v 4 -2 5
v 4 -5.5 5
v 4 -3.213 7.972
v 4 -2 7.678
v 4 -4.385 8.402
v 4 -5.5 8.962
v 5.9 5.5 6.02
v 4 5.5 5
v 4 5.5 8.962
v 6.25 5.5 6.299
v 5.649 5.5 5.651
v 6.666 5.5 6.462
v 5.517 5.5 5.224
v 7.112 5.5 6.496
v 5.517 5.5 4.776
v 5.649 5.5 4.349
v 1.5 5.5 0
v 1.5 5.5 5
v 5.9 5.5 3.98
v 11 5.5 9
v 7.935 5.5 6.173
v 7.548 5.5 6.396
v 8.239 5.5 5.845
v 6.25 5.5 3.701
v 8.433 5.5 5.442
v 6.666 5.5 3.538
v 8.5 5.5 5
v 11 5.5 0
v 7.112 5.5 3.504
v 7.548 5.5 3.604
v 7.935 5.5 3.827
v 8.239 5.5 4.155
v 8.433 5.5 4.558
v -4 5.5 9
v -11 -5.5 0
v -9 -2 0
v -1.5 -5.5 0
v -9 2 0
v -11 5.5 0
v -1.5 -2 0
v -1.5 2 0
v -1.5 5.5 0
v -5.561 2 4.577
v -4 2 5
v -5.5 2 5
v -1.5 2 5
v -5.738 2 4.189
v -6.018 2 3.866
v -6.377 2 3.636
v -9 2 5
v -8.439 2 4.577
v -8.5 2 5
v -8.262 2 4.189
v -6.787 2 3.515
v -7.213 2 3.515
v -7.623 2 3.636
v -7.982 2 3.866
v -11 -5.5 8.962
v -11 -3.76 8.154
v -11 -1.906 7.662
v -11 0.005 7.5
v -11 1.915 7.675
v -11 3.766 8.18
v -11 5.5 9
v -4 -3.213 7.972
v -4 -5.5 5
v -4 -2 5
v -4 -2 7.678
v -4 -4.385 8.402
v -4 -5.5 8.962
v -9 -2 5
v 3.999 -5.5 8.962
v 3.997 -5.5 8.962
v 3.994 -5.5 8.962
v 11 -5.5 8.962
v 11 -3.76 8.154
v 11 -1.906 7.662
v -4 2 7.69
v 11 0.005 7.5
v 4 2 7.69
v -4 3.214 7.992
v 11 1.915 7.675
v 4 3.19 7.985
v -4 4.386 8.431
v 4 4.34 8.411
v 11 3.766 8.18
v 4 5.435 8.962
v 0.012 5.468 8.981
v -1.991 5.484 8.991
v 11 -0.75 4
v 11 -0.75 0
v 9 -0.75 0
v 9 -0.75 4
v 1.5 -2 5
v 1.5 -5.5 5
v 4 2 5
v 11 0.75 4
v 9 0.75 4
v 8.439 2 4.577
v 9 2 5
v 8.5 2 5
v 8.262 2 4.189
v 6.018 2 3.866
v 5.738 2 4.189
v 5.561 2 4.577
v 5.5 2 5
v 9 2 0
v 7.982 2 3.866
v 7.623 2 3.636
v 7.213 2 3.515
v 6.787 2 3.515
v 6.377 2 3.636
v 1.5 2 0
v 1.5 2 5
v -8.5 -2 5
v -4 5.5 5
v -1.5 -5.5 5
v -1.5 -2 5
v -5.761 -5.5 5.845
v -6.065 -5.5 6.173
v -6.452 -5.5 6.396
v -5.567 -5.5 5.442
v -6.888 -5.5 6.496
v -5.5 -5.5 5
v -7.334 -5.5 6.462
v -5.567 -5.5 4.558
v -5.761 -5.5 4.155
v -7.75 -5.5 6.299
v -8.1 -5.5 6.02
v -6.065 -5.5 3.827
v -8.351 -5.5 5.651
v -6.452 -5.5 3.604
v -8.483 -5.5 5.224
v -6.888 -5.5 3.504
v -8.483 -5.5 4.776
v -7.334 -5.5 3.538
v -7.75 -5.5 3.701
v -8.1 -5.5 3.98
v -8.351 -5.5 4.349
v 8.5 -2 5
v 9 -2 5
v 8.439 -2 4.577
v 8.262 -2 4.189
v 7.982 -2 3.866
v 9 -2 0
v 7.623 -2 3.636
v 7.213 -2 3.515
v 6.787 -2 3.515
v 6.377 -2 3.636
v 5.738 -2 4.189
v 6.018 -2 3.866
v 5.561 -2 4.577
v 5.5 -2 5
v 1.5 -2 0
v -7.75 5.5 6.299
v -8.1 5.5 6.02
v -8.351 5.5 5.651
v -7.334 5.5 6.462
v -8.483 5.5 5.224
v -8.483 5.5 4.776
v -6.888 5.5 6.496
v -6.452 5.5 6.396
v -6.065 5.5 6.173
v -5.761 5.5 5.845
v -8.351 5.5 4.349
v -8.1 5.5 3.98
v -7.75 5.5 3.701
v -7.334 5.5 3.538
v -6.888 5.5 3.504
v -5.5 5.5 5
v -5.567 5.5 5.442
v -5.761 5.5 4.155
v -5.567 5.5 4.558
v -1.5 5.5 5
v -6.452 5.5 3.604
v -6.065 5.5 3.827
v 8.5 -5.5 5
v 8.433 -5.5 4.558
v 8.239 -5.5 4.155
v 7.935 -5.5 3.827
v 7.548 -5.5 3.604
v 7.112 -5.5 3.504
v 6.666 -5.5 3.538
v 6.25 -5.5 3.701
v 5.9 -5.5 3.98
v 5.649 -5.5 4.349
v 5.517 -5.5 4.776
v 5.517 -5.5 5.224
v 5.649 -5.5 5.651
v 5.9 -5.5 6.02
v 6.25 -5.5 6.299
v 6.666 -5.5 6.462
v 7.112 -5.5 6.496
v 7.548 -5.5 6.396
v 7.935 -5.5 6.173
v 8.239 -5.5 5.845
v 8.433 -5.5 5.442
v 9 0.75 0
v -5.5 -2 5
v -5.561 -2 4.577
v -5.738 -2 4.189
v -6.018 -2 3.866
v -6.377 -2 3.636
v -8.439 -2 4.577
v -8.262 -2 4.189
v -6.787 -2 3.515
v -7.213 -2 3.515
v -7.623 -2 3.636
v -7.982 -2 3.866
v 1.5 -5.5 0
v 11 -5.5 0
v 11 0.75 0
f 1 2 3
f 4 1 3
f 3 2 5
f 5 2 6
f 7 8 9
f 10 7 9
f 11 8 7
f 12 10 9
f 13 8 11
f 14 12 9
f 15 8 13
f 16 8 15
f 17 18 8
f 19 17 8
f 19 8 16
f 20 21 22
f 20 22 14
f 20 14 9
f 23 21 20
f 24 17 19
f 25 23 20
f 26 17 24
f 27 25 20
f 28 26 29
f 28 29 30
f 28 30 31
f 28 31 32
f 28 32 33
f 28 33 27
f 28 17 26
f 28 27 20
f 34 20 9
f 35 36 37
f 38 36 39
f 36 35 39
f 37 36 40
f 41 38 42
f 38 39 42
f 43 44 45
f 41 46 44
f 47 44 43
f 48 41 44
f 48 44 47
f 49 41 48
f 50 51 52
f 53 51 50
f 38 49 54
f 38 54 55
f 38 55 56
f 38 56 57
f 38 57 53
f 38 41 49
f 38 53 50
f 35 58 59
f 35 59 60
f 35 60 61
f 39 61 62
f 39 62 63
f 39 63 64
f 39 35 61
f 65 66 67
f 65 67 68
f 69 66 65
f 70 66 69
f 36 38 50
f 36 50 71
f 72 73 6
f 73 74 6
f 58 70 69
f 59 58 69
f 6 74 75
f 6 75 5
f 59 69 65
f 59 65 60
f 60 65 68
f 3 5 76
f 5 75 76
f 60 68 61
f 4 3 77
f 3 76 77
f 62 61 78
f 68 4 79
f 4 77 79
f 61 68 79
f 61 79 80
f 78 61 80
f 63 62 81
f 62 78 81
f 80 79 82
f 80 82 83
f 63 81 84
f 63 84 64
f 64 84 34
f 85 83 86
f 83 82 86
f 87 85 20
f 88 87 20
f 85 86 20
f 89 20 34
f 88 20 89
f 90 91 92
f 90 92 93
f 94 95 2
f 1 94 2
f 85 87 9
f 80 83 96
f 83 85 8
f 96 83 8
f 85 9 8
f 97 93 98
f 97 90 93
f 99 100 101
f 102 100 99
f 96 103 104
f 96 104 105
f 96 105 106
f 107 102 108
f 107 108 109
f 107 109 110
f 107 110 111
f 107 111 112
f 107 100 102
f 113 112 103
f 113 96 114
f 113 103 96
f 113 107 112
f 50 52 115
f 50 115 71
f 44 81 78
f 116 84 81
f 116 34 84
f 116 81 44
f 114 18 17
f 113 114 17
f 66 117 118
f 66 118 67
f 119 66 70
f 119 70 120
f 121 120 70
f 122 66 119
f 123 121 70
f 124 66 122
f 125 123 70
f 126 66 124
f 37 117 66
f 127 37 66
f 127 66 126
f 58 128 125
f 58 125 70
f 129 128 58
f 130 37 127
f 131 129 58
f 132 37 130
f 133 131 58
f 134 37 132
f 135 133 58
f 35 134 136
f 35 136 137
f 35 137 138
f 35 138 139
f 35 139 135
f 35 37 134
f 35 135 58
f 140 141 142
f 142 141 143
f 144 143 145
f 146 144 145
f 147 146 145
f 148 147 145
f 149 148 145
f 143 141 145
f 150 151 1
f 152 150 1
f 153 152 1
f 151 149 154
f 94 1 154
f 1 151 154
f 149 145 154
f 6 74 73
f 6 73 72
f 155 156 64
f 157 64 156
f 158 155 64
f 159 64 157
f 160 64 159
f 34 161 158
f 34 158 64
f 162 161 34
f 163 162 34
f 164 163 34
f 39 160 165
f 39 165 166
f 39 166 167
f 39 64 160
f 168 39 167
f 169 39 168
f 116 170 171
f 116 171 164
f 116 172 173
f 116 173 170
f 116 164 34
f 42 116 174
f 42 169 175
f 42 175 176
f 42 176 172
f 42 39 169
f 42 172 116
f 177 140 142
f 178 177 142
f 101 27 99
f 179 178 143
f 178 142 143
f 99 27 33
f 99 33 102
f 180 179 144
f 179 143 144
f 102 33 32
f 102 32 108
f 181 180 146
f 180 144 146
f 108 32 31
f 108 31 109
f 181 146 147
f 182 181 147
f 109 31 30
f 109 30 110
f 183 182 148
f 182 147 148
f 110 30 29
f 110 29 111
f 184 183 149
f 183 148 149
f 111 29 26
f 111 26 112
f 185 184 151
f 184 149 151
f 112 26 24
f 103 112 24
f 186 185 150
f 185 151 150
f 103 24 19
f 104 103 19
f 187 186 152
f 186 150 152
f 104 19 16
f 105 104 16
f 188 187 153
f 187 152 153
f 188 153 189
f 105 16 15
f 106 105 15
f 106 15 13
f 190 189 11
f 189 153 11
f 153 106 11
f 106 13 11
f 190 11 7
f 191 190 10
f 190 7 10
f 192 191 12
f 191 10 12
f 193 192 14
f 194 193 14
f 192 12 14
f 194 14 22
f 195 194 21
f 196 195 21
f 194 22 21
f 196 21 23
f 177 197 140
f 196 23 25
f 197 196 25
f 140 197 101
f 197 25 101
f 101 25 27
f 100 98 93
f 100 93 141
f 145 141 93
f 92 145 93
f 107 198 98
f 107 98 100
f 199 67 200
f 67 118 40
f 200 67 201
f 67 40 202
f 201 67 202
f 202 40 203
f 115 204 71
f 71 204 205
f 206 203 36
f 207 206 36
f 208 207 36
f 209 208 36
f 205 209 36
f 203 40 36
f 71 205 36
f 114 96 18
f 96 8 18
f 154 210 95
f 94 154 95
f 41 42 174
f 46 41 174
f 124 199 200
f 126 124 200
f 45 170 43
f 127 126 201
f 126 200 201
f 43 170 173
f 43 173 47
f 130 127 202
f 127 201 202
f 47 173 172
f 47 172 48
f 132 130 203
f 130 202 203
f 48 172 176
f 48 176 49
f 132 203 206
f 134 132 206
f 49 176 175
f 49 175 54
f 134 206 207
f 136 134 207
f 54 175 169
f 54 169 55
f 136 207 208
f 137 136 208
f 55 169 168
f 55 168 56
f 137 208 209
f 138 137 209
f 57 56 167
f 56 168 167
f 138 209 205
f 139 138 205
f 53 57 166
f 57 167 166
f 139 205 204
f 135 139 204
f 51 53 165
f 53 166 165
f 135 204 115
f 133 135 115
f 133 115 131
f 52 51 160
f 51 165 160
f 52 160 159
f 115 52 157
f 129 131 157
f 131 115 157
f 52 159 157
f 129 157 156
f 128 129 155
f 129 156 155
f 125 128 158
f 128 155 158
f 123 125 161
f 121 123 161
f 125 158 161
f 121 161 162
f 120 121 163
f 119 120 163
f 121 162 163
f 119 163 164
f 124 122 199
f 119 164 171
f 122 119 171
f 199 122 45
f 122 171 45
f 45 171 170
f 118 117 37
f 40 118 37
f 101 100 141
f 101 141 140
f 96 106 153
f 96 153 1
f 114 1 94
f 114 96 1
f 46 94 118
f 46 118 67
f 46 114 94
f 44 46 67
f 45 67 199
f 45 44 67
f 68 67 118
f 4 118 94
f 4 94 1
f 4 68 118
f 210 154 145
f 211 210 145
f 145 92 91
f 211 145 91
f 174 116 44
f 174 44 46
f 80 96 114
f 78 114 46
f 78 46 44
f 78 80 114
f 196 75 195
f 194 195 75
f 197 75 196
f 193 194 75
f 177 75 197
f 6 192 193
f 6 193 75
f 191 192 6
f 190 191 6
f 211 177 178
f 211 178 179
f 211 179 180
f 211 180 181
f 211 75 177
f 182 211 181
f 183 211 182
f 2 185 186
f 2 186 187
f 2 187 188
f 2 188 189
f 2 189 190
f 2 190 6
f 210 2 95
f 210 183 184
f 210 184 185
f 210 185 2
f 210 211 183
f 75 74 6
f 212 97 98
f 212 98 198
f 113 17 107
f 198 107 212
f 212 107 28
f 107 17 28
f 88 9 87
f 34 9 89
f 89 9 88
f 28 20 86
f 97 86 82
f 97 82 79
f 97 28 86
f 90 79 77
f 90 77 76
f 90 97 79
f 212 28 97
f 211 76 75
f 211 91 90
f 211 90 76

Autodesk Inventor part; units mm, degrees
ref_plane "YZ Plane" through (0, 0, 0) normal (1, 0, 0) x (0, 1, 0)
ref_plane "XZ Plane" through (0, 0, 0) normal (0, 1, 0) x (-1, 0, 0)
ref_plane "XY Plane" through (0, 0, 0) normal (0, 0, 1) x (1, 0, 0)
sketch "Sketch1" plane through (0, 0, 0) normal (0, 0, 1) x (1, 0, 0)
  line L0 (-11, 5.5) -> (11, 5.5)
  line L1 (11, 5.5) -> (11, -5.5)
  line L2 (11, -5.5) -> (-11, -5.5)
  line L3 (-11, -5.5) -> (-11, 5.5)
  line L4 (-11, 5.5) -> (11, -5.5) construction
  line L5 (11, 5.5) -> (-11, -5.5) construction
  point P0 (0, 0)
  dimension "d0" = 22
  dimension "d1" = 11
extrude "Extrusion1" add sketch "Sketch1" along normal blind 9
sketch "Sketch2" plane through (-11, 5.5, 0) normal (0, 1, 0) x (1, 0, 0)
  line L0 (0, 0) -> (0, -9) projected
  line L1 (22, 0) -> (22, -9) projected
  circle A0 centre (4, -5) radius 1.5
  circle A1 centre (18, -5) radius 1.5
  line L2 (0, 0) -> (22, 0) projected
  line L3 (22, 0) -> (22, -9) projected
  line L4 (4, 0) -> (4, -5)
  line L5 (18, -5) -> (18, 0)
  line L6 (0, -5) -> (4, -5)
  line L7 (22, -5) -> (18, -5)
  point P0 (11, 0)
  point P1 (9, -4)
  dimension "d6" = 3
  dimension "d7" = 3
  dimension "d25" = 5
  dimension "d26" = 5
  dimension "d27" = 4
  dimension "d28" = 4
extrude "Extrusion2" cut sketch "Sketch2" against normal up to next contours L6 L4 A0 | A0 L4 L6 | L5 L7 A1 | A1 L7 L5
sketch "Sketch3" plane through (11, -5.5, 0) normal (1, 0, 0) x (0, 0, -1)
  line L0 (-9, 0) -> (-9, 11) projected
  line L1 (0, 0) -> (-9, 0) projected
  line L2 (-9, 11) -> (-9, 0)
  line L3 (-9, 11) -> (-9, 0) projected
  arc A0 (-9, -0.0647) -> (-9, 11) centre (-18.452, 5.4676) ccw
  line L4 (-9, 11) -> (-9, -0.0647)
  line L5 (-6.5, 11) -> (-6.5, 0) projected
  line L6 (0, 0) -> (0, 11) projected
  line L7 (0, 6.25) -> (0, 4.75)
  point P0 (0, 5.5)
extrude "Extrusion3" cut sketch "Sketch3" against normal up to next
sketch "Sketch6" plane through (0, 0, 0) normal (0, 0, -1) x (-1, 0, 0)
  line L0 (-11, 5.5) -> (-11, -5.5) projected
  line L1 (-11, 5.5) -> (-11, 2.5)
  line L2 (-11, -5.5) -> (11, -5.5) projected
  line L3 (-11, -5.5) -> (-11, -2.5)
  line L4 (0, 0) -> (0, -2)
  line L5 (0, -2) -> (9, -2)
  line L6 (0, 0) -> (0, 2)
  line L7 (0, 2) -> (-9, 2)
  line L8 (9, -2) -> (-9, -2)
  line L9 (-9, -2) -> (-9, 2)
  line L10 (-9, 2) -> (9, 2)
  line L11 (9, 2) -> (9, -2)
  line L12 (-11, -5.5) -> (11, -5.5) projected
  line L13 (11, -5.5) -> (11, 5.5) projected
  dimension "d40" = 2
  dimension "d41" = 9
  dimension "d42" = 2
  dimension "d43" = 9
extrude "Extrusion6" cut sketch "Sketch6" against normal blind 5
sketch "Sketch4" plane through (-11, -5.5, 0) normal (0, -1, 0) x (1, 0, 0)
  line L0 (11, 0) -> (11, 2.5)
  line L1 (0, 0) -> (22, 0) projected
  line L2 (12.5, 5) -> (9.5, 5)
  line L3 (9.5, 5) -> (9.5, 0)
  line L4 (9.5, 0) -> (12.5, 0)
  line L5 (12.5, 0) -> (12.5, 5)
  line L6 (12.5, 5) -> (9.5, 0) construction
  line L7 (9.5, 5) -> (12.5, 0) construction
  line L8 (22, 8.9624) -> (0, 8.9624) projected
  line L9 (12.5, 5) -> (15, 5)
  line L10 (15, 5) -> (15, 8.9624)
  line L11 (9.5, 5) -> (7, 5)
  line L12 (7, 5) -> (7, 9)
  line L13 (22, 9) -> (0, 9) projected
  line L14 (7, 9) -> (15, 8.9624)
  dimension "d13" = 2.5
  dimension "d14" = 3
  dimension "d34" = 2.5
  dimension "d35" = 2.5
extrude "Extrusion4" cut sketch "Sketch4" against normal up to surface (3.5 mm away)
sketch "Sketch5" plane through (11, -5.5, 0) normal (1, 0, 0) x (0, 0, -1)
  line L0 (0, 5.5) -> (-4, 5.5)
  line L1 (-5, 0) -> (-5, 3) projected
  line L2 (0, 5.5) -> (0, 4.75)
  line L3 (0, 0) -> (0, 11) projected
  line L4 (-4, 5.5) -> (-4, 6.25)
  line L5 (0, 4.75) -> (-4, 4.75)
  line L6 (-4, 4.75) -> (-4, 6.25)
  line L7 (-4, 6.25) -> (0, 6.25)
  line L8 (0, 6.25) -> (0, 4.75)
  point P0 (-5, 11)
  dimension "d20" = 4
  dimension "d21" = 0.75
  dimension "d22" = 0.75
extrude "Extrusion5" cut sketch "Sketch5" against normal up to next
ref_plane "Work Plane1" through (11, 0, 0) normal (0, -1, 0) x (1, 0, 0)
mirror "Mirror1" about plane through (11, 0, 0) normal (0, -1, 0) of "Extrusion4"
equation "\"d7\" = d6"
equation "\"d26\" = d25"
equation "\"d28\" = d27"
equation "\"d22\" = d21"
properties part number "back_pack_clip_in_2"
